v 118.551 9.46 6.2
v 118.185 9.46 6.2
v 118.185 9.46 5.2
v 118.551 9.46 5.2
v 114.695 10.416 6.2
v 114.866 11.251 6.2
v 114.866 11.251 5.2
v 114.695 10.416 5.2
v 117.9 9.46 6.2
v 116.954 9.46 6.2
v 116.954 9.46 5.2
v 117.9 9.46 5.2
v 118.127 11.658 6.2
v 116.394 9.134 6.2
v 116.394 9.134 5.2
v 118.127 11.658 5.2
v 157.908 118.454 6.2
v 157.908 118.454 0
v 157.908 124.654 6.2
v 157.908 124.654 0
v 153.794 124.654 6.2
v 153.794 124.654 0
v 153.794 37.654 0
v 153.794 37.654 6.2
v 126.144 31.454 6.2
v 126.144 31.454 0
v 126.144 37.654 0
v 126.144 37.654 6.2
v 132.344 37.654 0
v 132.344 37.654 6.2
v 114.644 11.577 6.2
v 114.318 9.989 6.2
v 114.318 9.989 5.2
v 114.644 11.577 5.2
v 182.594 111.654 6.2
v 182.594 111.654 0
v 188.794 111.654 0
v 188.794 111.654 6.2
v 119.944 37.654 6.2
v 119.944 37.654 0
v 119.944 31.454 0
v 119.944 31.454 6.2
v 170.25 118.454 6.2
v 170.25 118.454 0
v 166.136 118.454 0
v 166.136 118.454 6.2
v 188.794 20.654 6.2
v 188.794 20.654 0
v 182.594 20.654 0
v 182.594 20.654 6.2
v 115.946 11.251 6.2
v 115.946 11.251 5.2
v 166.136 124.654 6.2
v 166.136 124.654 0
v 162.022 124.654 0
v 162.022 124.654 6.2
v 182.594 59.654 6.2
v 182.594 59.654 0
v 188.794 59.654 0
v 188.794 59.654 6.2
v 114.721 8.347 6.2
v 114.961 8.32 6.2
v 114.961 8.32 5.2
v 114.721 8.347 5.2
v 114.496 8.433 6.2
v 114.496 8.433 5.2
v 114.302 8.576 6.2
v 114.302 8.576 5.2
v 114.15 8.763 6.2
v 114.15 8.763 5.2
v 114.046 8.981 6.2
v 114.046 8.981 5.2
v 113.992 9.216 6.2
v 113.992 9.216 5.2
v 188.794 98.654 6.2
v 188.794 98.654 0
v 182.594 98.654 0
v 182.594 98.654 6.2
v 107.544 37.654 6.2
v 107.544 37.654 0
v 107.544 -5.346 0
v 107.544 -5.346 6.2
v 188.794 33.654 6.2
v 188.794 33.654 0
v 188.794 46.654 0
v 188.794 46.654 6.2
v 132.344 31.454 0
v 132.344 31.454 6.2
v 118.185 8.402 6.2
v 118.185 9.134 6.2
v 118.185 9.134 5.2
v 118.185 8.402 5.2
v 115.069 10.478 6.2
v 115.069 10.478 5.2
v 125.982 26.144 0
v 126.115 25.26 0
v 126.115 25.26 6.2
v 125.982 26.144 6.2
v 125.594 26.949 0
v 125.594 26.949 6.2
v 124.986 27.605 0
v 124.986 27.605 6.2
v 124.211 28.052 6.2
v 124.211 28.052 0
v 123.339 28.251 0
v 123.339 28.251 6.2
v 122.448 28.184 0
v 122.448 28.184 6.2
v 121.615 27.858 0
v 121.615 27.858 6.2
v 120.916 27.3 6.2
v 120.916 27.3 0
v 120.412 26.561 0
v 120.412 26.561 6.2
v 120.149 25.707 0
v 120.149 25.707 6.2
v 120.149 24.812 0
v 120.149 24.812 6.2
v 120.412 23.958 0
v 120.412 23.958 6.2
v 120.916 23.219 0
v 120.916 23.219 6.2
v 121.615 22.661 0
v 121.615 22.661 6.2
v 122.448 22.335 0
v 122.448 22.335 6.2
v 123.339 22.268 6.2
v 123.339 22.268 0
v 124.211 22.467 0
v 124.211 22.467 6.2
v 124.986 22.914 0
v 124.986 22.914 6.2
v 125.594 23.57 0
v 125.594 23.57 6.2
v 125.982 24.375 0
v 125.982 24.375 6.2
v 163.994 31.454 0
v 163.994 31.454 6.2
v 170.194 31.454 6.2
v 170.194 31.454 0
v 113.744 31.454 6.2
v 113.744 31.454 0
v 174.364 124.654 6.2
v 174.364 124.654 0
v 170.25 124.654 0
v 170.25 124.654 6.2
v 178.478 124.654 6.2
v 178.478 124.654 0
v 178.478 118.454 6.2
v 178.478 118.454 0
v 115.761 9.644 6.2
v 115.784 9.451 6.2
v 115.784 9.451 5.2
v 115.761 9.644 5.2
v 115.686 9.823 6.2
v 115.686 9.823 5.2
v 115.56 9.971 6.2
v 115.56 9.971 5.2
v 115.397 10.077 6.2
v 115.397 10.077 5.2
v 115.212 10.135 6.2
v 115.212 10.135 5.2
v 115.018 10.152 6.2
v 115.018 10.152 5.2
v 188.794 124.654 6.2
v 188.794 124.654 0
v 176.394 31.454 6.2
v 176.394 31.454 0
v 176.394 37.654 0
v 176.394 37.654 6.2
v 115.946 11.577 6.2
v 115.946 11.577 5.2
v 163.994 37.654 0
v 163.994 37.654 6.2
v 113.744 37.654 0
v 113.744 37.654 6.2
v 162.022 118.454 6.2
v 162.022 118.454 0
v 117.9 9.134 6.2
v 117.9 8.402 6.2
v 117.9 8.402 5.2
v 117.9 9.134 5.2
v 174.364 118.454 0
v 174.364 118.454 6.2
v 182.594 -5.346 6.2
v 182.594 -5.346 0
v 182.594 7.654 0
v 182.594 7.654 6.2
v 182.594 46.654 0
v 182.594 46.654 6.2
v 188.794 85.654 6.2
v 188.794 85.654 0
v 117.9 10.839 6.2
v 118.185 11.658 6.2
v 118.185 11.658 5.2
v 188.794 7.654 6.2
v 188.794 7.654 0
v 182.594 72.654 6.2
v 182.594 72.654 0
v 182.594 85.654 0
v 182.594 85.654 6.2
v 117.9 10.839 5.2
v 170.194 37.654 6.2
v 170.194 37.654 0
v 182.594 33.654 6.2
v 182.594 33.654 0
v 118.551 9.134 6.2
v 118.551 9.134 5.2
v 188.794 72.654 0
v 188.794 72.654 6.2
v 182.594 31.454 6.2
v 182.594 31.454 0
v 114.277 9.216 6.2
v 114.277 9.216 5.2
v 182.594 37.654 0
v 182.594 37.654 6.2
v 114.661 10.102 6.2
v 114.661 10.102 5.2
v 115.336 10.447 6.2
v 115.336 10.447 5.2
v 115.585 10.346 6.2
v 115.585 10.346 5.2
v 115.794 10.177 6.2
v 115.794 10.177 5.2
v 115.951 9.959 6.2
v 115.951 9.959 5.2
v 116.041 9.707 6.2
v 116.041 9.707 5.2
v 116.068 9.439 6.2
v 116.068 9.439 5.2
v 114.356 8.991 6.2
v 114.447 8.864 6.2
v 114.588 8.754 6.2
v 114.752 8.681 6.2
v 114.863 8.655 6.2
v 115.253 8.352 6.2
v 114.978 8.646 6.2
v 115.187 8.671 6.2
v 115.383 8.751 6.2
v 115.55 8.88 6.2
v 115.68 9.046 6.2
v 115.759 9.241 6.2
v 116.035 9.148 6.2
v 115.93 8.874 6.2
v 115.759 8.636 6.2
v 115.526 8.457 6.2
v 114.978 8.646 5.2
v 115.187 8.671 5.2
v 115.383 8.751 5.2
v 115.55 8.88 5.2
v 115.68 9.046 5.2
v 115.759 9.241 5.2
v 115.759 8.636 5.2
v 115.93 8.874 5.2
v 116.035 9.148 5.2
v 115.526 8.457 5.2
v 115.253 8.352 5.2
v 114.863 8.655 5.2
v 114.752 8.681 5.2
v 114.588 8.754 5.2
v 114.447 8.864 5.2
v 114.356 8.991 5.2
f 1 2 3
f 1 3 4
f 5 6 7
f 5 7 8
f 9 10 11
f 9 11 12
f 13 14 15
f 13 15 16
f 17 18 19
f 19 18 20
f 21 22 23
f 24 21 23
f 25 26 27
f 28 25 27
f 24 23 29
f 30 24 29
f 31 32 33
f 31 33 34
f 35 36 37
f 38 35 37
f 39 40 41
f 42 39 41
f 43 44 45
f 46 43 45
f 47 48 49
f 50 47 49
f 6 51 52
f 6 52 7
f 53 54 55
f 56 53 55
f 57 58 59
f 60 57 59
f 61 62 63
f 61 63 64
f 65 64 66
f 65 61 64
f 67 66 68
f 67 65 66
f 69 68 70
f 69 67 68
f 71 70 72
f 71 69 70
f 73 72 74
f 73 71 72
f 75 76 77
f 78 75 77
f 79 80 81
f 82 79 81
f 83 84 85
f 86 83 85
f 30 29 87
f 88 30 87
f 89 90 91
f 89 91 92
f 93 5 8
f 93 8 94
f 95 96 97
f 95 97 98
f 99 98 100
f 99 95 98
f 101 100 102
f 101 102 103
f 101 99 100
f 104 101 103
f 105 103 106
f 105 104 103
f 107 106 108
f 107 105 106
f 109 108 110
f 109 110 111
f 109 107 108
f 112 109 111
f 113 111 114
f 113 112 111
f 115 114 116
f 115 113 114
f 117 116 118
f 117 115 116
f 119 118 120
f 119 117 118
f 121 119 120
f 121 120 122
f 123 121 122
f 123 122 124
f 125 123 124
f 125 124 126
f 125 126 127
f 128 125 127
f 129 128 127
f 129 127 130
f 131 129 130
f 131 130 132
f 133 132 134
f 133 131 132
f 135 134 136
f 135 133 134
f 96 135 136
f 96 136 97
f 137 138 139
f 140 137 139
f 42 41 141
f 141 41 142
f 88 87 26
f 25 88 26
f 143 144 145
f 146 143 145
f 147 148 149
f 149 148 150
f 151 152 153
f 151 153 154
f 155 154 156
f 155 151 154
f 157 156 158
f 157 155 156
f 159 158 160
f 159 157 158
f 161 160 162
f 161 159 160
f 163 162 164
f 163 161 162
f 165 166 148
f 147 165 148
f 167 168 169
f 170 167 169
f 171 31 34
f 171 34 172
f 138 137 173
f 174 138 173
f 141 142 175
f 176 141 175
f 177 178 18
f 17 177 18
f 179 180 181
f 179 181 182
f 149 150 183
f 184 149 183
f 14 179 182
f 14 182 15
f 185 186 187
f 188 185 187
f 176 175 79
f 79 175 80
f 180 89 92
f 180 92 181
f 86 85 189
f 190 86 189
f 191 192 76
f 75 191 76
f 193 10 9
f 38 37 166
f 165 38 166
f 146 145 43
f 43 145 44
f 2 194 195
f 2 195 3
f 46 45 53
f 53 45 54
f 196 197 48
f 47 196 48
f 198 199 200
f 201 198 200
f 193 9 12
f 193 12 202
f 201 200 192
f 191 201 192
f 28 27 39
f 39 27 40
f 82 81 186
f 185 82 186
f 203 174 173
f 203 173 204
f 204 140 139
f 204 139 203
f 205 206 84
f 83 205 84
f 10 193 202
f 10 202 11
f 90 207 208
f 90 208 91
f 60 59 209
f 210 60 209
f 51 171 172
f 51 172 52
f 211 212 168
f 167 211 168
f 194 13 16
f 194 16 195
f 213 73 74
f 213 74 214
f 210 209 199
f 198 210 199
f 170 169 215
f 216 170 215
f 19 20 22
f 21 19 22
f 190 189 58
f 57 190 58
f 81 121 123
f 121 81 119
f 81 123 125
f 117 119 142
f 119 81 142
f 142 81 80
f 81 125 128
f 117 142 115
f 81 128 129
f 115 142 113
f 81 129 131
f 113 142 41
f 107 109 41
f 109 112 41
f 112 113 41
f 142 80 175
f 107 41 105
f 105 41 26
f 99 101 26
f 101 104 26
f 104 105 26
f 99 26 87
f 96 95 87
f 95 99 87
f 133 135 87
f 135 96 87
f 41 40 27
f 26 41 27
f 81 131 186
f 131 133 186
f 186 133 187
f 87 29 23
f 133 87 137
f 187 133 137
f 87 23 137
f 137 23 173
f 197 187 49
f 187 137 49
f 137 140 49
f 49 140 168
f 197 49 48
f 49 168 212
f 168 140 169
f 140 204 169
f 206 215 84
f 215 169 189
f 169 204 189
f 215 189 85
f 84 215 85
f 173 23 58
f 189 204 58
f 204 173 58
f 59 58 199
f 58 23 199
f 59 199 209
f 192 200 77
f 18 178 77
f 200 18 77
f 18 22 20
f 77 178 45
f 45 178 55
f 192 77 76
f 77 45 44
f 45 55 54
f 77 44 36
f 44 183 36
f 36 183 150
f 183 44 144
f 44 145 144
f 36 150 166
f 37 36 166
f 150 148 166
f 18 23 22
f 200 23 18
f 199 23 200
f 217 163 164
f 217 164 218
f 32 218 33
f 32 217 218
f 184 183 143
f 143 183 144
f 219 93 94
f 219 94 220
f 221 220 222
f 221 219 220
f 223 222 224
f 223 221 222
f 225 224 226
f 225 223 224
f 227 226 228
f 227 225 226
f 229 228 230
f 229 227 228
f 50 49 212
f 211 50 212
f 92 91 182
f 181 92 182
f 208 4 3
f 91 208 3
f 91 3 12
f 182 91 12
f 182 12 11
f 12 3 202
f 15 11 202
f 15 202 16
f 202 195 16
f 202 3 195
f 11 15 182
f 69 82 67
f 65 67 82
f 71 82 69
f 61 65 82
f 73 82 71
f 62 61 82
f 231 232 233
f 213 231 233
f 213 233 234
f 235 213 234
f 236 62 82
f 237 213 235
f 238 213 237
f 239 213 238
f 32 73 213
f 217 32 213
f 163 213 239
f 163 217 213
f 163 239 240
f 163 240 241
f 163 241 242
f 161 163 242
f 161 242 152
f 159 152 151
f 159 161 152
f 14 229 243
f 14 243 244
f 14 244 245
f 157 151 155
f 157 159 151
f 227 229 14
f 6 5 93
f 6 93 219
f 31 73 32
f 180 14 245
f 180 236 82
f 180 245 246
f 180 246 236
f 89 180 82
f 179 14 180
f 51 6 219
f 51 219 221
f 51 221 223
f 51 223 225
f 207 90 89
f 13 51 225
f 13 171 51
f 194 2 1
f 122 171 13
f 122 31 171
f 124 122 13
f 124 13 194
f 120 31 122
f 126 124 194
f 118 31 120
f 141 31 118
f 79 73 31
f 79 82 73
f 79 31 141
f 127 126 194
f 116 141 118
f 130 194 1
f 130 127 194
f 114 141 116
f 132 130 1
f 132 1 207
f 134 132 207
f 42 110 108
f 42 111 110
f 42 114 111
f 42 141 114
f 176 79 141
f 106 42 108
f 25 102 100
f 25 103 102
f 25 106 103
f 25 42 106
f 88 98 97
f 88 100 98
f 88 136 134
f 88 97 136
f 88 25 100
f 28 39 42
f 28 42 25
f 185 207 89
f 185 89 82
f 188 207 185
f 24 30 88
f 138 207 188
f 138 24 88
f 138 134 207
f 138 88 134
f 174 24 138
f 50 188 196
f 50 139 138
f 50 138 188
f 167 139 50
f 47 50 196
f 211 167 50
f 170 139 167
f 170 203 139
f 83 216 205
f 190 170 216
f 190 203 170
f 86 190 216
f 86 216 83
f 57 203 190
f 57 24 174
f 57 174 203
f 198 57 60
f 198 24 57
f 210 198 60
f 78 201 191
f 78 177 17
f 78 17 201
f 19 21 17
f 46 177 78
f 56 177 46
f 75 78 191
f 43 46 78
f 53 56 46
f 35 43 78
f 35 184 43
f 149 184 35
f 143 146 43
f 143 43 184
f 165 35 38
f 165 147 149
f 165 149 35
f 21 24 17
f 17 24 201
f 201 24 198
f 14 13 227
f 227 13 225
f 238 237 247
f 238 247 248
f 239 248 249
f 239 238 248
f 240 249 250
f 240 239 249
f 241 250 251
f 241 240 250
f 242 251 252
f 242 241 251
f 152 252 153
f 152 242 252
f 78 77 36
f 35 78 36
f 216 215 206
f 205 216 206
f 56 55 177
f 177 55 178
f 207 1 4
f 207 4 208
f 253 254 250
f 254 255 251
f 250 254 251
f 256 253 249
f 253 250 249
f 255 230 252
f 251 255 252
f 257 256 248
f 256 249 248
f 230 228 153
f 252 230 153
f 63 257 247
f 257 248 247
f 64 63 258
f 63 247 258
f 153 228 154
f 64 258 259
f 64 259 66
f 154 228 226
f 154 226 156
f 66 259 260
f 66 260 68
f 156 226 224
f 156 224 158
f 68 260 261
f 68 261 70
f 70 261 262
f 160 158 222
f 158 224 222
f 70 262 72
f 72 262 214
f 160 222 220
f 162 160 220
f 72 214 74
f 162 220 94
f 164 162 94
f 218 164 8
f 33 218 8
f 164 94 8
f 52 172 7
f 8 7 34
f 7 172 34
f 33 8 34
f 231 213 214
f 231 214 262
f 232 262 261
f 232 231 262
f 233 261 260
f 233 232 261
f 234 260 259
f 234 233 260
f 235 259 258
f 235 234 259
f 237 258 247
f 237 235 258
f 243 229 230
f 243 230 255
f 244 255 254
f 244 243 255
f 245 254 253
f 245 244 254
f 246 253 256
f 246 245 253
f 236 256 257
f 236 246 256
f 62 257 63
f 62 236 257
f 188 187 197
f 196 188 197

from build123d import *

# Parameters (mm, degrees)
SKETCH6_R           = 3
SKETCH6_W           = 6.2
SKETCH6_H           = 6.2
BOSS_EXTRUDE4_DEPTH = 6.2
CUT_EXTRUDE3_DEPTH  = 1


with BuildPart() as part:
    # Sketch6 → Boss-Extrude4 (new body)
    with BuildSketch(Plane.XY):
        Polygon((157.908027241, 124.653899243), (153.794027241, 124.653899243), (153.794027241, 37.653899243), (132.344027241, 37.653899243), (132.344027241, 31.453899243), (126.144027241, 31.453899243), (126.144027241, 37.653899243), (119.944027241, 37.653899243), (119.944027241, 31.453899243), (113.744027241, 31.453899243), (113.744027241, 37.653899243), (107.544027241, 37.653899243), (107.544027241, -5.346100757), (182.594027241, -5.346100757), (182.594027241, 7.653899243), (188.794027241, 7.653899243), (188.794027241, 20.653899243), (182.594027241, 20.653899243), (182.594027241, 31.453899243), (176.394027241, 31.453899243), (176.394027241, 37.653899243), (182.594027241, 37.653899243), (182.594027241, 33.653899243), (188.794027241, 33.653899243), (188.794027241, 46.653899243), (182.594027241, 46.653899243), (182.594027241, 59.653899243), (188.794027241, 59.653899243), (188.794027241, 72.653899243), (182.594027241, 72.653899243), (182.594027241, 85.653899243), (188.794027241, 85.653899243), (188.794027241, 98.653899243), (182.594027241, 98.653899243), (182.594027241, 111.653899243), (188.794027241, 111.653899243), (188.794027241, 124.653899243), (178.478027241, 124.653899243), (178.478027241, 118.453899243), (174.364027241, 118.453899243), (174.364027241, 124.653899243), (170.250027241, 124.653899243), (170.250027241, 118.453899243), (166.136027241, 118.453899243), (166.136027241, 124.653899243), (162.022027241, 124.653899243), (162.022027241, 118.453899243), (157.908027241, 118.453899243), align=None)
        with Locations((123.115137004, 25.259504391)):
            Circle(SKETCH6_R, mode=Mode.SUBTRACT)
        with Locations((167.094027241, 34.553899243)):
            Rectangle(SKETCH6_W, SKETCH6_H, mode=Mode.SUBTRACT)
    extrude(amount=BOSS_EXTRUDE4_DEPTH)

    # Sketch7 → Cut-Extrude3 (cut)
    with BuildSketch(Plane.XY.offset(6.2)):
        with BuildLine():
            Line((115.946331614, 11.576783669), (115.946331614, 11.251142644))
            Line((115.946331614, 11.251142644), (114.866373682, 11.251142644))
            Line((114.866373682, 11.251142644), (114.69528494, 10.416051498))
            add(Edge.make_bspline(
                [(114.69528494, 10.416051498), (114.728899911, 10.425331816), (114.794023603, 10.443310964), (114.890144334, 10.463273342), (114.981395832, 10.475306994), (115.040609919, 10.476950112), (115.069263305, 10.477745208)],
                knots=[0, 0, 0, 0, 0.000104595, 0.000202637, 0.000294305, 0.000380252, 0.000380252, 0.000380252, 0.000380252], degree=3))
            add(Edge.make_bspline(
                [(115.069263305, 10.477745208), (115.10471784, 10.476977823), (115.174430315, 10.475468954), (115.276428503, 10.460980204), (115.37379477, 10.43817471), (115.466325492, 10.40631538), (115.554191848, 10.365575836), (115.636585422, 10.314685176), (115.714742957, 10.255237083), (115.78726231, 10.186888393), (115.853052218, 10.111666641), (115.910897081, 10.030787715), (115.960030287, 9.945037622), (115.999546115, 9.853597069), (116.031100475, 9.75747698), (116.052102642, 9.655665995), (116.0660878, 9.549123772), (116.06765025, 9.476276054), (116.068446999, 9.439128421)],
                knots=[0, 0, 0, 0, 0.000106308, 0.000209029, 0.000308378, 0.000405929, 0.000502102, 0.000598312, 0.00069588, 0.000796219, 0.000896736, 0.000995218, 0.001094066, 0.001192613, 0.001293582, 0.001396995, 0.001504047, 0.001615439, 0.001615439, 0.001615439, 0.001615439], degree=3))
            add(Edge.make_bspline(
                [(116.068446999, 9.439128421), (116.067843681, 9.413254692), (116.066645197, 9.361856897), (116.060550479, 9.285526086), (116.048815936, 9.21081123), (116.033060929, 9.137702418), (116.012611736, 9.066338059), (115.987856666, 8.996513887), (115.957561698, 8.928664494), (115.924331807, 8.862147885), (115.886915359, 8.798467811), (115.845387713, 8.738914802), (115.801513304, 8.682595489), (115.754304332, 8.630113888), (115.703322001, 8.581814865), (115.649183746, 8.537411781), (115.592321565, 8.496153717), (115.531855738, 8.459715426), (115.469133628, 8.426184744), (115.40324946, 8.398676964), (115.335702967, 8.374083842), (115.265521973, 8.354480913), (115.192865443, 8.339120668), (115.117613611, 8.32868798), (115.040161146, 8.321089354), (114.987660242, 8.320613688), (114.961140308, 8.320373413)],
                knots=[0, 0, 0, 0, 7.7636e-05, 0.000154223, 0.000229512, 0.000304362, 0.000378447, 0.000452077, 0.000526407, 0.000601214, 0.00067506, 0.000747747, 0.00081887, 0.000889121, 0.000959302, 0.001029336, 0.001099058, 0.00116985, 0.001240974, 0.00131221, 0.00138383, 0.001456517, 0.001530612, 0.001606437, 0.001684346, 0.001763871, 0.001763871, 0.001763871, 0.001763871], degree=3))
            add(Edge.make_bspline(
                [(114.961140308, 8.320373413), (114.929504444, 8.321000102), (114.867264619, 8.322233038), (114.776078105, 8.335131235), (114.688344141, 8.353604216), (114.604768978, 8.38139569), (114.524603617, 8.41621845), (114.448927295, 8.460229548), (114.375806341, 8.51010345), (114.308213279, 8.568959198), (114.245478804, 8.633289853), (114.189320757, 8.703101427), (114.139306727, 8.777241707), (114.096237628, 8.856070747), (114.059500137, 8.939381414), (114.030639398, 9.02748585), (114.007345461, 9.119923711), (113.997490787, 9.183562967), (113.99248546, 9.215886233)],
                knots=[0, 0, 0, 0, 9.4843e-05, 0.000186593, 0.000275792, 0.000363484, 0.000450342, 0.000537514, 0.000625728, 0.000715478, 0.000805885, 0.000894984, 0.00098389, 0.001073836, 0.001164117, 0.001256635, 0.001351658, 0.001449737, 0.001449737, 0.001449737, 0.001449737], degree=3))
            Line((113.99248546, 9.215886233), (114.277421358, 9.215886233))
            add(Edge.make_bspline(
                [(114.277421358, 9.215886233), (114.284432264, 9.185609023), (114.297907613, 9.127414543), (114.327485686, 9.045652541), (114.36364973, 8.972791531), (114.406652246, 8.907867695), (114.457951202, 8.851253818), (114.516488613, 8.800801198), (114.582118333, 8.755285188), (114.655046477, 8.717345963), (114.731984056, 8.684989308), (114.812508596, 8.663443128), (114.894427539, 8.648293032), (114.949834347, 8.646776506), (114.977676767, 8.646014439)],
                knots=[0, 0, 0, 0, 9.3172e-05, 0.000179081, 0.000260145, 0.000336703, 0.000411917, 0.000488562, 0.000568128, 0.000650923, 0.00073478, 0.000817953, 0.000900557, 0.000983994, 0.000983994, 0.000983994, 0.000983994], degree=3))
            add(Edge.make_bspline(
                [(114.977676767, 8.646014439), (115.004853355, 8.646759001), (115.058364281, 8.648225052), (115.137114611, 8.659509013), (115.213144861, 8.676887667), (115.28570482, 8.702895321), (115.356064217, 8.734504458), (115.42244328, 8.77506742), (115.486762318, 8.821749008), (115.547022125, 8.875231094), (115.602212197, 8.934167888), (115.650976678, 8.997193809), (115.691595736, 9.064428377), (115.725825963, 9.134707595), (115.751818598, 9.208801714), (115.770361488, 9.286363495), (115.781249978, 9.367584512), (115.782747834, 9.4229831), (115.783511101, 9.451212756)],
                knots=[0, 0, 0, 0, 8.15e-05, 0.000160473, 0.000238226, 0.000315066, 0.000391338, 0.000469218, 0.000547964, 0.000629516, 0.000710512, 0.000789892, 0.000868102, 0.000945761, 0.001024012, 0.00110315, 0.001184644, 0.001269321, 0.001269321, 0.001269321, 0.001269321], degree=3))
            add(Edge.make_bspline(
                [(115.783511101, 9.451212756), (115.782913767, 9.476681473), (115.781744568, 9.526532864), (115.772191837, 9.59946643), (115.755575726, 9.668475547), (115.732512635, 9.733893459), (115.70323051, 9.795781868), (115.66744707, 9.854204644), (115.624490773, 9.908391764), (115.575421703, 9.95836858), (115.521666194, 10.004492145), (115.46229937, 10.043811424), (115.39856358, 10.076889406), (115.331226729, 10.105435376), (115.258687142, 10.125937481), (115.18238134, 10.141329777), (115.101485326, 10.150233713), (115.046176202, 10.15146914), (115.017745877, 10.152104182)],
                knots=[0, 0, 0, 0, 7.6388e-05, 0.000149519, 0.000220172, 0.000288967, 0.000357247, 0.000425206, 0.000494043, 0.000564207, 0.000635056, 0.000706145, 0.000777268, 0.000850264, 0.000925136, 0.001002969, 0.001083601, 0.001168886, 0.001168886, 0.001168886, 0.001168886], degree=3))
            add(Edge.make_bspline(
                [(115.017745877, 10.152104182), (114.993136063, 10.151577503), (114.942323041, 10.150490044), (114.864378762, 10.142483151), (114.782471271, 10.129566076), (114.69691455, 10.111798552), (114.60745166, 10.088547504), (114.514271397, 10.060685064), (114.417177841, 10.027372965), (114.351756762, 10.002215885), (114.318126486, 9.989283669)],
                knots=[0, 0, 0, 0, 7.3822e-05, 0.000152423, 0.000234822, 0.000322511, 0.00041445, 0.000512043, 0.000614219, 0.000722306, 0.000722306, 0.000722306, 0.000722306], degree=3))
            Line((114.318126486, 9.989283669), (114.643767512, 11.576783669))
            Line((114.643767512, 11.576783669), (115.946331614, 11.576783669))
        make_face()
        Polygon((118.127236061, 11.658193926), (118.185113666, 11.658193926), (118.185113666, 9.460117003), (118.551459819, 9.460117003), (118.551459819, 9.134475977), (118.185113666, 9.134475977), (118.185113666, 8.401783669), (117.900177768, 8.401783669), (117.900177768, 9.134475977), (116.394088025, 9.134475977), align=None)
        Polygon((117.900177768, 9.460117003), (117.900177768, 10.839003221), (116.953783537, 9.460117003), align=None, mode=Mode.SUBTRACT)
    extrude(amount=-CUT_EXTRUDE3_DEPTH, mode=Mode.SUBTRACT)


solid = part.part
